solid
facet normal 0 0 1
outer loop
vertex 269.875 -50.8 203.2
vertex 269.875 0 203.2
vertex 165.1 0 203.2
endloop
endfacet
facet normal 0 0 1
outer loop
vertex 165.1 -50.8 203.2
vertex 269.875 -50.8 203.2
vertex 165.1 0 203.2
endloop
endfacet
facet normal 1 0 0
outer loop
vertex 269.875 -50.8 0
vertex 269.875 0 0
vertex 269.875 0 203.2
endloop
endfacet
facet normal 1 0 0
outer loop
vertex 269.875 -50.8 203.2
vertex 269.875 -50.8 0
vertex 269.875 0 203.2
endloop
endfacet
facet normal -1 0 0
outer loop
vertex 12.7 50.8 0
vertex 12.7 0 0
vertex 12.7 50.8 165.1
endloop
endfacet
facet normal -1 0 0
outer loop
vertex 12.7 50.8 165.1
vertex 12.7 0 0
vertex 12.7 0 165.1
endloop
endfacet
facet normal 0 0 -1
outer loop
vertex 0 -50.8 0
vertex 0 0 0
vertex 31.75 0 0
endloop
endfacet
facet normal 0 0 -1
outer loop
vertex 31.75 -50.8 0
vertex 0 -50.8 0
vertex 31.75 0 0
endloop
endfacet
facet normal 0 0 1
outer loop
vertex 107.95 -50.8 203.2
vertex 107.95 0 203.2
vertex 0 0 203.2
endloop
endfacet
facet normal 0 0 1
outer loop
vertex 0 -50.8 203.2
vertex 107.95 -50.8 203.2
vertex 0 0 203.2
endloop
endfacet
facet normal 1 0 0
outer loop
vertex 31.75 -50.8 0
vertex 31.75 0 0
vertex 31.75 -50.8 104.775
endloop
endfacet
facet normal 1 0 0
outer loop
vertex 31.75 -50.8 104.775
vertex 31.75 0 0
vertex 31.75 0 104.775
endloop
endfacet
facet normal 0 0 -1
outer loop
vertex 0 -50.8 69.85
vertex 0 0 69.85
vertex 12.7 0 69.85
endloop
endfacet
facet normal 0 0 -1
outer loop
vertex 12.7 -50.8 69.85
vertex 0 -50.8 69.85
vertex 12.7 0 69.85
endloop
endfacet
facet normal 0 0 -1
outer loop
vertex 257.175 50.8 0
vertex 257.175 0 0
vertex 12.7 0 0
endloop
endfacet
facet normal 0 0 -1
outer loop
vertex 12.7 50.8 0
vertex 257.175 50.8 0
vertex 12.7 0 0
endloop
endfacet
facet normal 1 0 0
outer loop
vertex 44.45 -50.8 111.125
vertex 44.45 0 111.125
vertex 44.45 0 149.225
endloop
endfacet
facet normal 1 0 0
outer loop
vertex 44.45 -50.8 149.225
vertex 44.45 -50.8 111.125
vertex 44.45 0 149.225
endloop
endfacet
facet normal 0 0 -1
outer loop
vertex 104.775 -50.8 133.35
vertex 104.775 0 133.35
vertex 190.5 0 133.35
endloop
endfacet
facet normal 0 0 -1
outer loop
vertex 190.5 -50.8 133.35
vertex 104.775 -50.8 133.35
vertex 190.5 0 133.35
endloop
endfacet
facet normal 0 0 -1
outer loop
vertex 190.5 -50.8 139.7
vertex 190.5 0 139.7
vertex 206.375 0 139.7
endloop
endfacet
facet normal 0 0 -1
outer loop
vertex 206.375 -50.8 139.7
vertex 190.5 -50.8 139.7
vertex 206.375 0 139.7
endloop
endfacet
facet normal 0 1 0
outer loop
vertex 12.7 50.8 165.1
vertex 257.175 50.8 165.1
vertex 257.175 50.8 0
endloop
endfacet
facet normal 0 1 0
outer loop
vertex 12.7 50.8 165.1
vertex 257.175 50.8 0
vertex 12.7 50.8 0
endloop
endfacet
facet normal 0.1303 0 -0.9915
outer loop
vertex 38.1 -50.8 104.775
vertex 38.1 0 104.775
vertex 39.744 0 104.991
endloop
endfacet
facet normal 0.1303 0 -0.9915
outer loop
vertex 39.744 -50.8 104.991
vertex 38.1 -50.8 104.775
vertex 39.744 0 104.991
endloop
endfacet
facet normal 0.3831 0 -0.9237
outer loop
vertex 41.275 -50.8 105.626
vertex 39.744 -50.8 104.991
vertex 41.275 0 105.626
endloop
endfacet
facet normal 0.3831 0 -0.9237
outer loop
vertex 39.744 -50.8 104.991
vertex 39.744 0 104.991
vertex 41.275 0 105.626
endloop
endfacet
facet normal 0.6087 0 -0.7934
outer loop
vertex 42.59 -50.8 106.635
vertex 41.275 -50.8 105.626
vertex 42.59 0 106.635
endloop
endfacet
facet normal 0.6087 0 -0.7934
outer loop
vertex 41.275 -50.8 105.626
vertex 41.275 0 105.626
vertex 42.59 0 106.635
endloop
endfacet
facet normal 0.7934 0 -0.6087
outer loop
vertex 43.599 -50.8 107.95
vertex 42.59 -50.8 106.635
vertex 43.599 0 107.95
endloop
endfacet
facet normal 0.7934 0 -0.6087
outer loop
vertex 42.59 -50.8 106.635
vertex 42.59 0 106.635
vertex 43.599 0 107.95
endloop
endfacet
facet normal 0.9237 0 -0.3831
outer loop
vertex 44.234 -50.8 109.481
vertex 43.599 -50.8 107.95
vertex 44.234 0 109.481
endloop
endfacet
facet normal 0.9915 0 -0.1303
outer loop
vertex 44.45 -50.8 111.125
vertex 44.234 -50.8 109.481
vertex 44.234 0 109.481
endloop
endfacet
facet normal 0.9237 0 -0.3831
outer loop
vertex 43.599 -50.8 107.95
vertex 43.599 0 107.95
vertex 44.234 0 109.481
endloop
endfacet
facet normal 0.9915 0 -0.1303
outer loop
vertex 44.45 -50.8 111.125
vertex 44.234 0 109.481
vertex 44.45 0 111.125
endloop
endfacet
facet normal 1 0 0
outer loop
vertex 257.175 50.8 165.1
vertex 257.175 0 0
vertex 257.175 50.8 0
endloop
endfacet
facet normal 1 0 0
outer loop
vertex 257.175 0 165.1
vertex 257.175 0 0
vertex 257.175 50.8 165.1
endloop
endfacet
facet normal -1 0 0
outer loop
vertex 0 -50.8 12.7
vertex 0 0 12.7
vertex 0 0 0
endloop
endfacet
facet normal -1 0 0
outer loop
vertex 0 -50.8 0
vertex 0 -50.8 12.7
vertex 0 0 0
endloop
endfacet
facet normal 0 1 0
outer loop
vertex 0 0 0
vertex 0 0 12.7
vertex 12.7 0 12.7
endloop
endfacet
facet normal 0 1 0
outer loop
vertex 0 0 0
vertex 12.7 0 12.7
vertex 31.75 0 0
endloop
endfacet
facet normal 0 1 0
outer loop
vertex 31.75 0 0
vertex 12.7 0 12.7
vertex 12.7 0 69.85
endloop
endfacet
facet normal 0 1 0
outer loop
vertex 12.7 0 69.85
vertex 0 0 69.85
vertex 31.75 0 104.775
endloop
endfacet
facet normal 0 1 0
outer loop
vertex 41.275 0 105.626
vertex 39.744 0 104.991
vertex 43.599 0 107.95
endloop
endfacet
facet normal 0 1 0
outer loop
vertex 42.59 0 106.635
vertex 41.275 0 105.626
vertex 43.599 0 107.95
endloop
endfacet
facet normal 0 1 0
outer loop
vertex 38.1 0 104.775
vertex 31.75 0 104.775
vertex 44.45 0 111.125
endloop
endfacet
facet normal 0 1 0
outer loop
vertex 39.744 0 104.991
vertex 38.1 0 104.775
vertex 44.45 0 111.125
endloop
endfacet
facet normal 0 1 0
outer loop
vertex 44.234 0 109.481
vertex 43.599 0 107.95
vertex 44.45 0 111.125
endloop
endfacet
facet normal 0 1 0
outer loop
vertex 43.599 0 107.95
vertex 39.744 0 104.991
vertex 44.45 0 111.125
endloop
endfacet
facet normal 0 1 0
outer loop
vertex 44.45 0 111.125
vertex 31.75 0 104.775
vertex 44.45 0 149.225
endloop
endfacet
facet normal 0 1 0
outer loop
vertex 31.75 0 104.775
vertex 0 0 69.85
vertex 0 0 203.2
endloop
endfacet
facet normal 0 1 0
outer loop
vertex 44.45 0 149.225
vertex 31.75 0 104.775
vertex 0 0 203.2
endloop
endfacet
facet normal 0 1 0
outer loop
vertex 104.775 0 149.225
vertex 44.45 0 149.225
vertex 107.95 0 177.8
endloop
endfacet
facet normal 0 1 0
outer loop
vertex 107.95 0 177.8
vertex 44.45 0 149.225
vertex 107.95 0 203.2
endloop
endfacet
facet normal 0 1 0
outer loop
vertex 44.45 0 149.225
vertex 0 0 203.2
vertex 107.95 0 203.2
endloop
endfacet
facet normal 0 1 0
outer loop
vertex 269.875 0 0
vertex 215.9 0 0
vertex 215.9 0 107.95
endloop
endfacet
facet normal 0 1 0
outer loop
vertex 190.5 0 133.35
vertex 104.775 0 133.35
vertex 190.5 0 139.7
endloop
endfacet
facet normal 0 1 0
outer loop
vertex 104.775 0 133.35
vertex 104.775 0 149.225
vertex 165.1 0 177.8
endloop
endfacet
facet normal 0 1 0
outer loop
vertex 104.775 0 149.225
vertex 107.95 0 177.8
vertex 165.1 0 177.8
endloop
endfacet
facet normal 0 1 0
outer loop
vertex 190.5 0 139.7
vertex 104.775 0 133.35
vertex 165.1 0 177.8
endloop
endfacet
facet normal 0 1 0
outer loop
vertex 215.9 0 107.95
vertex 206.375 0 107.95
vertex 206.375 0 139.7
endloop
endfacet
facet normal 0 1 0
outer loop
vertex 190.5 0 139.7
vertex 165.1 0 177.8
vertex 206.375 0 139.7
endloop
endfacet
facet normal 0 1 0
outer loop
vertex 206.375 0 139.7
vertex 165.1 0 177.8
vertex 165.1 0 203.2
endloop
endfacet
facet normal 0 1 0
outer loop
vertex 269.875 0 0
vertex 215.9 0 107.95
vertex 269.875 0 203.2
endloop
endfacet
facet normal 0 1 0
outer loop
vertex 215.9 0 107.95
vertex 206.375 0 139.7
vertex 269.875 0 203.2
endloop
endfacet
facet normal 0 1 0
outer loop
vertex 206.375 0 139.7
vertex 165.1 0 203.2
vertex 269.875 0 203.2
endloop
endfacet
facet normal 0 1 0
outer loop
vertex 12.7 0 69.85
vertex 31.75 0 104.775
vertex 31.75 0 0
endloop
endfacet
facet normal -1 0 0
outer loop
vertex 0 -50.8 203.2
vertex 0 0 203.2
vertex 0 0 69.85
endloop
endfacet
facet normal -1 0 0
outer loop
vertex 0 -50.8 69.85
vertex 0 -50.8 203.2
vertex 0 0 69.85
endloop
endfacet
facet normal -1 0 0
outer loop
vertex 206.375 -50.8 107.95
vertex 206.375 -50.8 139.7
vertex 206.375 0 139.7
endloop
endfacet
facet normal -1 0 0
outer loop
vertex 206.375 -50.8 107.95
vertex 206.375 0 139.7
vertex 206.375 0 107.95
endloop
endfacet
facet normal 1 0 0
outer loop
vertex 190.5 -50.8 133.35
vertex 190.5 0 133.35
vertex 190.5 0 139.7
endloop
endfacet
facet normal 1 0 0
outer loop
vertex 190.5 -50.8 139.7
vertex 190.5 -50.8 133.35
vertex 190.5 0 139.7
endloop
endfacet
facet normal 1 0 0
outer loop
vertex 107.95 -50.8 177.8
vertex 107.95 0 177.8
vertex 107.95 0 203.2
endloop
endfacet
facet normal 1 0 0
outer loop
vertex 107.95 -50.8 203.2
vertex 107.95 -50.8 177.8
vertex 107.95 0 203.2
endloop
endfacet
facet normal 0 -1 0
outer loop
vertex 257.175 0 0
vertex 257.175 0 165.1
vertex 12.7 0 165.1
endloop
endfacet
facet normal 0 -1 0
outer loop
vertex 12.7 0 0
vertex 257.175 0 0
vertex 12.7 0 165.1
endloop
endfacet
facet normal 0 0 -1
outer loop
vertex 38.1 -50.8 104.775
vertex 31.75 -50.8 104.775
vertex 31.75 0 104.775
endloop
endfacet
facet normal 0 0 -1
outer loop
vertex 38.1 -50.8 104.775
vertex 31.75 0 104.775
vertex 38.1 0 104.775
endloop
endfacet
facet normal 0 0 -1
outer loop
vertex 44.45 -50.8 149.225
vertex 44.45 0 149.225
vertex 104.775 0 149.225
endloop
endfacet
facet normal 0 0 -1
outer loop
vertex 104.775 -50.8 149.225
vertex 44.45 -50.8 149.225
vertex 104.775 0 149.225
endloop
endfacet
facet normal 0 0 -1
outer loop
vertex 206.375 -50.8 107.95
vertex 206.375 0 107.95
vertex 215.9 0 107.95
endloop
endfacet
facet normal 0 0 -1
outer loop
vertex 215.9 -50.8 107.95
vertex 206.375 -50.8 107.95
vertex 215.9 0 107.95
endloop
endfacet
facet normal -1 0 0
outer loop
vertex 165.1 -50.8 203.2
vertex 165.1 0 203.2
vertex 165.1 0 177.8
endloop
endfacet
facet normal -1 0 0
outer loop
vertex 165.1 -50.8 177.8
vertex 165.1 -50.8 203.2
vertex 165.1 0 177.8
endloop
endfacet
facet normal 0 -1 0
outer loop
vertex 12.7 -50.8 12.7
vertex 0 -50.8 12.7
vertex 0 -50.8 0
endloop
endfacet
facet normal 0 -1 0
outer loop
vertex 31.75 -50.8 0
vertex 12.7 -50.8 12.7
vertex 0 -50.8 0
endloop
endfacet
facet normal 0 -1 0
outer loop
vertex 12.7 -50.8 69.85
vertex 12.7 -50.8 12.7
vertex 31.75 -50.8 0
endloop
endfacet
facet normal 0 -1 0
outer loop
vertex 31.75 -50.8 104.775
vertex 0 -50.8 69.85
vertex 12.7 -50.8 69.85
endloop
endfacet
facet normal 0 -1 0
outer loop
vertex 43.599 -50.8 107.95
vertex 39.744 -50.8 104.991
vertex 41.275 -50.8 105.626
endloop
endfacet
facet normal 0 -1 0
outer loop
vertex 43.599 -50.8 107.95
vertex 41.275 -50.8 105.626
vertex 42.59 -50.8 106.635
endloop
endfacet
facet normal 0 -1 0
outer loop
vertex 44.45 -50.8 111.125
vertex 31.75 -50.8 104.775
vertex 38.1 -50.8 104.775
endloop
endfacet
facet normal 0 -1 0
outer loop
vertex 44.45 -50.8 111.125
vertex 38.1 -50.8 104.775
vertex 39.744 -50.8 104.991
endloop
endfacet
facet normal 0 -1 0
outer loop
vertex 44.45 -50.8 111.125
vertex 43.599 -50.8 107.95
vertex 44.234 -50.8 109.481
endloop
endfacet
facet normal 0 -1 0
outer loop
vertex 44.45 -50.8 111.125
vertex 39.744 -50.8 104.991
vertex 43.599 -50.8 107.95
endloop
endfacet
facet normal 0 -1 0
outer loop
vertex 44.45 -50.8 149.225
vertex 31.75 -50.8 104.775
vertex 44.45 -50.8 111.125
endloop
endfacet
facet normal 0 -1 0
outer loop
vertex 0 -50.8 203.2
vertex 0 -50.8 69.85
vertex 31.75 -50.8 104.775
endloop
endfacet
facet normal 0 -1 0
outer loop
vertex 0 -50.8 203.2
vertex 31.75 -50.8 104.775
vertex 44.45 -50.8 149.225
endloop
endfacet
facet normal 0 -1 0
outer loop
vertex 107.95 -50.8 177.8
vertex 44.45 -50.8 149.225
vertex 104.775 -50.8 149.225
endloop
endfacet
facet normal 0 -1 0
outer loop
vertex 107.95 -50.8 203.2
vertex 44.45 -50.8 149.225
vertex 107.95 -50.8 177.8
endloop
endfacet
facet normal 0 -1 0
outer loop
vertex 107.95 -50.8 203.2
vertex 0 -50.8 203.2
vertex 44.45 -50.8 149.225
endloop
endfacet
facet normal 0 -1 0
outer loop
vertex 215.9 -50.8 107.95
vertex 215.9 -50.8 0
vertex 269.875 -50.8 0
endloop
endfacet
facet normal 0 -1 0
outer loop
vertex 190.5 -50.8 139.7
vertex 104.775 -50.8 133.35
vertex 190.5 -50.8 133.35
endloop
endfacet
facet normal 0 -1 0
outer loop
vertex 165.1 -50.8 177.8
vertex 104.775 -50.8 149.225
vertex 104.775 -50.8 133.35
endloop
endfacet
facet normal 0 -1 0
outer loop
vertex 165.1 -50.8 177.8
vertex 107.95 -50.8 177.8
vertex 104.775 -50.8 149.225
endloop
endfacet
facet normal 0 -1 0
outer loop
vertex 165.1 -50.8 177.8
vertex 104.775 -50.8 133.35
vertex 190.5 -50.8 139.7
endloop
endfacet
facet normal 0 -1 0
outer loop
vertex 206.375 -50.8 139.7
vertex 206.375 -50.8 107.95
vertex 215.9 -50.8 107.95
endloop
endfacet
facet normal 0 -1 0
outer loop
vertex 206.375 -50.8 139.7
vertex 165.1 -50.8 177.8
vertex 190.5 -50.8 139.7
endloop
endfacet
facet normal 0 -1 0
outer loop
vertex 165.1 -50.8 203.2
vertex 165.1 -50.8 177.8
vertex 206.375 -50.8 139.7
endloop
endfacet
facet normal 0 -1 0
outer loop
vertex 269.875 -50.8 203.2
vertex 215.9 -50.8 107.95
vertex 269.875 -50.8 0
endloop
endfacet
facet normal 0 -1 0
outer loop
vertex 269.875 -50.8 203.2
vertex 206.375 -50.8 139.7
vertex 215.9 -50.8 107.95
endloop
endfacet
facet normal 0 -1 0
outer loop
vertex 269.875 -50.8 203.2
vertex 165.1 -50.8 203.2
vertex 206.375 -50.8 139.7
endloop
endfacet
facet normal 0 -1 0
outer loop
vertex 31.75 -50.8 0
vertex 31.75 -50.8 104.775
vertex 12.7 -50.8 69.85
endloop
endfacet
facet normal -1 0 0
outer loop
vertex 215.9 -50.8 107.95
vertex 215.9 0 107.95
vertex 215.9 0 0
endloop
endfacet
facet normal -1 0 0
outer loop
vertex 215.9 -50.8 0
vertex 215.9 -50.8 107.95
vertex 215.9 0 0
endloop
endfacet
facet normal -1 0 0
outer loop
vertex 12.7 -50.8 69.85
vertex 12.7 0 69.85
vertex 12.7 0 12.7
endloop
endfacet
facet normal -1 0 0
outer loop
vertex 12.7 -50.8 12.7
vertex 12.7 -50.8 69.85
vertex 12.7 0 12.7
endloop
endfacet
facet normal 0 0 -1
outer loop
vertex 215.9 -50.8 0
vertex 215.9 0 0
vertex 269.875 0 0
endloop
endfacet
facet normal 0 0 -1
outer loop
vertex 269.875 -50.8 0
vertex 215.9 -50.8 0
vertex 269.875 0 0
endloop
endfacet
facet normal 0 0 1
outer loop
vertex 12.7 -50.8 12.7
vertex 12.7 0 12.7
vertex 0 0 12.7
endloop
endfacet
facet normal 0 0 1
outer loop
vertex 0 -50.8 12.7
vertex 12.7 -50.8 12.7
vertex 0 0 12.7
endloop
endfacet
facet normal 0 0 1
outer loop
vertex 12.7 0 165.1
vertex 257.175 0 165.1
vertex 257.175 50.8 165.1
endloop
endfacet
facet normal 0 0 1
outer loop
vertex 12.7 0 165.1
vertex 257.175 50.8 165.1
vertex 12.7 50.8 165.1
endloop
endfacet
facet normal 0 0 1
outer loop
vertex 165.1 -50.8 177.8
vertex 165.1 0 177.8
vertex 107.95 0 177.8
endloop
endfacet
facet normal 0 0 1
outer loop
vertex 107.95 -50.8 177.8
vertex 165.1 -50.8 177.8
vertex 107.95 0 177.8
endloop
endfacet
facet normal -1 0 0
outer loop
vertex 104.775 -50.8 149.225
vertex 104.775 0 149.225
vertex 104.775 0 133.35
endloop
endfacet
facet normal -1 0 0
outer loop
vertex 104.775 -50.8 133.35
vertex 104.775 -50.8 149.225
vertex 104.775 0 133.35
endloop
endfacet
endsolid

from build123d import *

# Parameters (mm, degrees)
F1_DEPTH = 50.8
F2_W     = 244.475
F2_H     = 165.1
F3_DEPTH = 50.8


with BuildPart() as f1:
    # F0 (on Front) → F1 (new body)
    with BuildSketch(Plane.XZ):
        with BuildLine():
            Line((0, 12.7), (0, 0))
            Line((0, 0), (31.75, 0))
            Line((31.75, 0), (31.75, 104.775))
            Line((31.75, 104.775), (38.1, 104.775))
            ThreePointArc((38.1, 104.775), (42.590128, 106.634872), (44.45, 111.125))
            Line((44.45, 111.125), (44.45, 149.225))
            Line((44.45, 149.225), (104.775, 149.225))
            Line((104.775, 149.225), (104.775, 133.35))
            Line((104.775, 133.35), (190.5, 133.35))
            Line((190.5, 133.35), (190.5, 139.7))
            Line((190.5, 139.7), (206.375, 139.7))
            Line((206.375, 139.7), (206.375, 107.95))
            Line((206.375, 107.95), (215.9, 107.95))
            Line((215.9, 107.95), (215.9, 0))
            Line((215.9, 0), (269.875, 0))
            Line((269.875, 0), (269.875, 203.2))
            Line((269.875, 203.2), (165.1, 203.2))
            Line((165.1, 203.2), (165.1, 177.8))
            Line((165.1, 177.8), (107.95, 177.8))
            Line((107.95, 177.8), (107.95, 203.2))
            Line((107.95, 203.2), (0, 203.2))
            Line((0, 203.2), (0, 69.85))
            Line((0, 69.85), (12.7, 69.85))
            Line((12.7, 69.85), (12.7, 12.7))
            Line((12.7, 12.7), (0, 12.7))
        make_face()
    extrude(amount=F1_DEPTH)


with BuildPart() as f3:
    # F2 (on face) → F3 (new body)
    with BuildSketch(Plane(origin=(0, 0, 0), x_dir=(-1, 0, 0), z_dir=(0, 1, 0))):
        with Locations((-134.9375, 82.55)):
            Rectangle(F2_W, F2_H)
    extrude(amount=F3_DEPTH)


solid = Compound([f1.part, f3.part])
